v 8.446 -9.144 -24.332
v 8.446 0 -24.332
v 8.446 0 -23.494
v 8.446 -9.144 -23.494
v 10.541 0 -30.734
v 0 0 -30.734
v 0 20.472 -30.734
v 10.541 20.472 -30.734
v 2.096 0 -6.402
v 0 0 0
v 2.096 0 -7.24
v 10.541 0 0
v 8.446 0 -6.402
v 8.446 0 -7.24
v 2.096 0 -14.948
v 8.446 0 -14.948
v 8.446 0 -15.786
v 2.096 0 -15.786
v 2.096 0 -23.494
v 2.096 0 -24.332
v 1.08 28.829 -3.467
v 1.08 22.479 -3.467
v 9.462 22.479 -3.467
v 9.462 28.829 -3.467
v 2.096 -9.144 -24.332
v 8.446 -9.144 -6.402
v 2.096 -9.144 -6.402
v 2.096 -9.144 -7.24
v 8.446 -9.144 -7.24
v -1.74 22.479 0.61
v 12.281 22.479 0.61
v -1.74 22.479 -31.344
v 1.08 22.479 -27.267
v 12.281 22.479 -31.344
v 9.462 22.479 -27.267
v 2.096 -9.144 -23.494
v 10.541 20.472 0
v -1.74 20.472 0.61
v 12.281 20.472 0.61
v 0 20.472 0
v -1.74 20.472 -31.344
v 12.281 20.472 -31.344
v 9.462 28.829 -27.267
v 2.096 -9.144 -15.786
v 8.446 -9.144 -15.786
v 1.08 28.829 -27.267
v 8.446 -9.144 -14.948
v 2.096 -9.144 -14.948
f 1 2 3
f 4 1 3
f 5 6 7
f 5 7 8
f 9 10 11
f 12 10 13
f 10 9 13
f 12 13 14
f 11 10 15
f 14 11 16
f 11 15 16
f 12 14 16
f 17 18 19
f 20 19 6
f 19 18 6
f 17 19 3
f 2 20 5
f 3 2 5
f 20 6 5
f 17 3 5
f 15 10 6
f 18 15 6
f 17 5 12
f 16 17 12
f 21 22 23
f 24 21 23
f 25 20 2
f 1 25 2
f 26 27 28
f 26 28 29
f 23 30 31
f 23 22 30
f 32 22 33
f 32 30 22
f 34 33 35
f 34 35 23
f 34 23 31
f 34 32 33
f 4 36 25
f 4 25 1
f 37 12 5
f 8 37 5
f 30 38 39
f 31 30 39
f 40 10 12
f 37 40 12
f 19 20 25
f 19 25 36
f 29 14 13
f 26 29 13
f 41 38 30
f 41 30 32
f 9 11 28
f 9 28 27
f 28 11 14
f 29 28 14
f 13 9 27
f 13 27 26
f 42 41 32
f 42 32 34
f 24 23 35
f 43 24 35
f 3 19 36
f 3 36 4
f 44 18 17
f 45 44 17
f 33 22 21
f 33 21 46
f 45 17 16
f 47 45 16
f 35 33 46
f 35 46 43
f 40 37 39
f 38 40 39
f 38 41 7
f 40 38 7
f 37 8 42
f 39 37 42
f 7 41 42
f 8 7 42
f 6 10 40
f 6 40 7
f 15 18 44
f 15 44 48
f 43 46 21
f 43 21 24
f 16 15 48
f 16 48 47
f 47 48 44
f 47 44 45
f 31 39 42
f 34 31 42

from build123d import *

# Parameters (mm, degrees)
SKETCH1_W           = 10.541
SKETCH1_H           = 30.734
BOSS_EXTRUDE1_DEPTH = 20.4724
SKETCH2_W           = 14.0208
SKETCH2_H           = 31.9532
BOSS_EXTRUDE2_DEPTH = 2.0066
SKETCH3_W           = 8.382
SKETCH3_H           = 23.7998
BOSS_EXTRUDE3_DEPTH = 6.35
SKETCH4_W           = 6.35
SKETCH4_H           = 0.8382
BOSS_EXTRUDE4_DEPTH = 9.144


with BuildPart() as part:
    # Sketch1 → Boss-Extrude1 (new body)
    with BuildSketch(Plane(origin=(0, 0, 0), x_dir=(1, 0, 0), z_dir=(0, 1, 0))):
        with Locations((5.2705, 15.367)):
            Rectangle(SKETCH1_W, SKETCH1_H)
    extrude(amount=BOSS_EXTRUDE1_DEPTH)

    # Sketch2 → Boss-Extrude2 (add)
    with BuildSketch(Plane(origin=(0, 20.4724, 0), x_dir=(1, 0, 0), z_dir=(0, 1, 0))):
        with Locations((5.2705, 15.367)):
            Rectangle(SKETCH2_W, SKETCH2_H)
    extrude(amount=BOSS_EXTRUDE2_DEPTH)

    # Sketch3 → Boss-Extrude3 (add)
    with BuildSketch(Plane(origin=(0, 22.479, 0), x_dir=(1, 0, 0), z_dir=(0, 1, 0))):
        with Locations((5.2705, 15.367)):
            Rectangle(SKETCH3_W, SKETCH3_H)
    extrude(amount=BOSS_EXTRUDE3_DEPTH)

    # Sketch4 → Boss-Extrude4 (add)
    with BuildSketch(Plane.XZ):
        with Locations((5.2705, -23.913230798)):
            Rectangle(SKETCH4_W, SKETCH4_H)
        with Locations((5.2705, -15.367)):
            Rectangle(SKETCH4_W, SKETCH4_H)
        with Locations((5.2705, -6.820769202)):
            Rectangle(SKETCH4_W, SKETCH4_H)
    extrude(amount=BOSS_EXTRUDE4_DEPTH)


solid = part.part
